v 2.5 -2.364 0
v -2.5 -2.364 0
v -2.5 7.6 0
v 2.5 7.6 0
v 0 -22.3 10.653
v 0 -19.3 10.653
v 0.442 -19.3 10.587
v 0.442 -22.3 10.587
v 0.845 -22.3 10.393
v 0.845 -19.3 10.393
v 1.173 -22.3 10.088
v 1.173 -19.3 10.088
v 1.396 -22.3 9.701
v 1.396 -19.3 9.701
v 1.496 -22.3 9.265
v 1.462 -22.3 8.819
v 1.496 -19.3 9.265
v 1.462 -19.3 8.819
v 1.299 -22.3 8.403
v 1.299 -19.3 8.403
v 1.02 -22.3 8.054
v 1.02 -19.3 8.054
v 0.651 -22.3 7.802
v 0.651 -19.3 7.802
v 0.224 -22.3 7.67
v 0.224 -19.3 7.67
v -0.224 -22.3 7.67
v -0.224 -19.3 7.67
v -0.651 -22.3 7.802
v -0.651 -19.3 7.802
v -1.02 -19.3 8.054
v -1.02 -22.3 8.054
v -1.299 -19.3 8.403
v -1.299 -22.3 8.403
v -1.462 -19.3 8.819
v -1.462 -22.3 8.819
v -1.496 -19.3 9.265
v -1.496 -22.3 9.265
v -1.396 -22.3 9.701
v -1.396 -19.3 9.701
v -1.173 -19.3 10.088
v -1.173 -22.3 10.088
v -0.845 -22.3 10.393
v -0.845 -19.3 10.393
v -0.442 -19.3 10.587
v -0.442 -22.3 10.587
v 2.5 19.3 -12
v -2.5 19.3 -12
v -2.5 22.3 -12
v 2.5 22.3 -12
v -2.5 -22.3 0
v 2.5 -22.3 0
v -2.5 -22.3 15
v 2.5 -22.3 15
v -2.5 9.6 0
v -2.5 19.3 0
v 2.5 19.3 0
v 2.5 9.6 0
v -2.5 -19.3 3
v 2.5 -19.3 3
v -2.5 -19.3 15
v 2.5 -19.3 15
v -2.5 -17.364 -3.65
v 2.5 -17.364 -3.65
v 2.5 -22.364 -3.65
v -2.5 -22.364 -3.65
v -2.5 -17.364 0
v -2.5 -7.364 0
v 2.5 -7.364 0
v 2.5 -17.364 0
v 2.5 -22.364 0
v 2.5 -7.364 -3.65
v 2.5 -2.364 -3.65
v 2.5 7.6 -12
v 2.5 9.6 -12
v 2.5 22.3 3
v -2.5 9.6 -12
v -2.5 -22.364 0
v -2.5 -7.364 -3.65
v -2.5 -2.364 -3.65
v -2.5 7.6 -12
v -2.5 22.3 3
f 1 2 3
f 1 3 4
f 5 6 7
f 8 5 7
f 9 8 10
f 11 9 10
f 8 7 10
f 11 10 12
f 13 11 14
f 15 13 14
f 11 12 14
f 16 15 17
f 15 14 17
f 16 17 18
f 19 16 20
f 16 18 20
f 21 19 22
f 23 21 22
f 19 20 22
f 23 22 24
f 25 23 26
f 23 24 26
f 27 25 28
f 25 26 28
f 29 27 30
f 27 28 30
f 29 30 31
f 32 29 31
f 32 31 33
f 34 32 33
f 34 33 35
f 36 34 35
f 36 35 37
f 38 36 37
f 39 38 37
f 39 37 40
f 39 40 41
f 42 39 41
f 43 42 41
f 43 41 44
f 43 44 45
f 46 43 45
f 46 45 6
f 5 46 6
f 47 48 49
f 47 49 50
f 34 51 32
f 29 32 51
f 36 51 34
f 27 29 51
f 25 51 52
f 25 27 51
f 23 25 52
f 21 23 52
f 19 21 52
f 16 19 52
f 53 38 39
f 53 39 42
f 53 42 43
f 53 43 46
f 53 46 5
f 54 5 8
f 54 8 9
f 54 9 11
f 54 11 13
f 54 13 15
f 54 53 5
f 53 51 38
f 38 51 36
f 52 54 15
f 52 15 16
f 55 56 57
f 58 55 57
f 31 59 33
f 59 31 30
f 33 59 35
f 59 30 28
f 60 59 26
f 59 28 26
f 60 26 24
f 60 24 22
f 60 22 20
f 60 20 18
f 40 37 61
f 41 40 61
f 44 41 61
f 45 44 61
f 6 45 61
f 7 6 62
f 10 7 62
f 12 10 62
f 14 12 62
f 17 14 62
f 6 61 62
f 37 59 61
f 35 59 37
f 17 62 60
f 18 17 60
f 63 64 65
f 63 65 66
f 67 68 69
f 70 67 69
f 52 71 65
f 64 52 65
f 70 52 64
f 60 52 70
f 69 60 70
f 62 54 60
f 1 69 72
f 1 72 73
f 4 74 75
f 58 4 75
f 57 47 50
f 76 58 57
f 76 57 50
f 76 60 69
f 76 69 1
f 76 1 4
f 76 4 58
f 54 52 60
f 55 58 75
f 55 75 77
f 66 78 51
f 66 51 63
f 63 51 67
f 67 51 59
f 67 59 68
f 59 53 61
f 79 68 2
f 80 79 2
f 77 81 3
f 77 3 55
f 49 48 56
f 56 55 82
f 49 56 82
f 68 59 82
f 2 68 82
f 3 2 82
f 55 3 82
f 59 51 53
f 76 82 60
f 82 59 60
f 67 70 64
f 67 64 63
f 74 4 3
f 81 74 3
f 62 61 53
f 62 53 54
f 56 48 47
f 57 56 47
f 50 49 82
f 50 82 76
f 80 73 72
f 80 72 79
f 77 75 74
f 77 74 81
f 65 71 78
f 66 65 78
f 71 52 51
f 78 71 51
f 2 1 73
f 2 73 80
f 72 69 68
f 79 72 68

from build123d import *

# Parameters (mm, degrees)
SKETCH1_W           = 5
SKETCH1_H           = 38.6
BOSS_EXTRUDE1_DEPTH = 3
SKETCH3_W           = 5
SKETCH3_H           = 15
BOSS_EXTRUDE2_DEPTH = 3
SKETCH4_R           = 1.5
CUT_EXTRUDE1_DEPTH  = 4
SKETCH7_W           = 5
SKETCH7_H           = 15
BOSS_EXTRUDE3_DEPTH = 3
SKETCH8_W           = 5
SKETCH8_H           = 2
BOSS_EXTRUDE4_DEPTH = 12
SKETCH10_W          = 5
SKETCH10_H          = 5
BOSS_EXTRUDE5_DEPTH = 3.65


with BuildPart() as part:
    # Sketch1 → Boss-Extrude1 (new body)
    with BuildSketch(Plane.XY):
        Rectangle(SKETCH1_W, SKETCH1_H)
    extrude(amount=BOSS_EXTRUDE1_DEPTH)

    # Sketch3 → Boss-Extrude2 (add)
    with BuildSketch(Plane.XZ.offset(19.3)):
        with Locations((0, 7.5)):
            Rectangle(SKETCH3_W, SKETCH3_H)
    extrude(amount=BOSS_EXTRUDE2_DEPTH)

    # Sketch4 → Cut-Extrude1 (cut)
    with BuildSketch(Plane(origin=(0, -19.3, 0), x_dir=(1, 0, 0), z_dir=(0, 1, 0))):
        with Locations(Location((0, -9.153210304, 0), (0, 0, 270))):
            Circle(SKETCH4_R)
    extrude(amount=-CUT_EXTRUDE1_DEPTH, mode=Mode.SUBTRACT)

    # Sketch7 → Boss-Extrude3 (add)
    with BuildSketch(Plane(origin=(0, 19.3, 0), x_dir=(1, 0, 0), z_dir=(0, 1, 0))):
        with Locations((0, 4.5)):
            Rectangle(SKETCH7_W, SKETCH7_H)
    extrude(amount=BOSS_EXTRUDE3_DEPTH)

    # Sketch8 → Boss-Extrude4 (add)
    with BuildSketch(Plane(origin=(0, 0, 0), x_dir=(-1, 0, 0), z_dir=(0, 0, -1))):
        with Locations((0, 8.6)):
            Rectangle(SKETCH8_W, SKETCH8_H)
    extrude(amount=BOSS_EXTRUDE4_DEPTH)

    # Sketch10 → Boss-Extrude5 (add)
    with BuildSketch(Plane(origin=(0, 0, 0), x_dir=(-1, 0, 0), z_dir=(0, 0, -1))):
        with Locations((0, -4.864250557)):
            Rectangle(SKETCH10_W, SKETCH10_H)
        with Locations((0, -19.864250557)):
            Rectangle(SKETCH10_W, SKETCH10_H)
    extrude(amount=BOSS_EXTRUDE5_DEPTH)


solid = part.part
